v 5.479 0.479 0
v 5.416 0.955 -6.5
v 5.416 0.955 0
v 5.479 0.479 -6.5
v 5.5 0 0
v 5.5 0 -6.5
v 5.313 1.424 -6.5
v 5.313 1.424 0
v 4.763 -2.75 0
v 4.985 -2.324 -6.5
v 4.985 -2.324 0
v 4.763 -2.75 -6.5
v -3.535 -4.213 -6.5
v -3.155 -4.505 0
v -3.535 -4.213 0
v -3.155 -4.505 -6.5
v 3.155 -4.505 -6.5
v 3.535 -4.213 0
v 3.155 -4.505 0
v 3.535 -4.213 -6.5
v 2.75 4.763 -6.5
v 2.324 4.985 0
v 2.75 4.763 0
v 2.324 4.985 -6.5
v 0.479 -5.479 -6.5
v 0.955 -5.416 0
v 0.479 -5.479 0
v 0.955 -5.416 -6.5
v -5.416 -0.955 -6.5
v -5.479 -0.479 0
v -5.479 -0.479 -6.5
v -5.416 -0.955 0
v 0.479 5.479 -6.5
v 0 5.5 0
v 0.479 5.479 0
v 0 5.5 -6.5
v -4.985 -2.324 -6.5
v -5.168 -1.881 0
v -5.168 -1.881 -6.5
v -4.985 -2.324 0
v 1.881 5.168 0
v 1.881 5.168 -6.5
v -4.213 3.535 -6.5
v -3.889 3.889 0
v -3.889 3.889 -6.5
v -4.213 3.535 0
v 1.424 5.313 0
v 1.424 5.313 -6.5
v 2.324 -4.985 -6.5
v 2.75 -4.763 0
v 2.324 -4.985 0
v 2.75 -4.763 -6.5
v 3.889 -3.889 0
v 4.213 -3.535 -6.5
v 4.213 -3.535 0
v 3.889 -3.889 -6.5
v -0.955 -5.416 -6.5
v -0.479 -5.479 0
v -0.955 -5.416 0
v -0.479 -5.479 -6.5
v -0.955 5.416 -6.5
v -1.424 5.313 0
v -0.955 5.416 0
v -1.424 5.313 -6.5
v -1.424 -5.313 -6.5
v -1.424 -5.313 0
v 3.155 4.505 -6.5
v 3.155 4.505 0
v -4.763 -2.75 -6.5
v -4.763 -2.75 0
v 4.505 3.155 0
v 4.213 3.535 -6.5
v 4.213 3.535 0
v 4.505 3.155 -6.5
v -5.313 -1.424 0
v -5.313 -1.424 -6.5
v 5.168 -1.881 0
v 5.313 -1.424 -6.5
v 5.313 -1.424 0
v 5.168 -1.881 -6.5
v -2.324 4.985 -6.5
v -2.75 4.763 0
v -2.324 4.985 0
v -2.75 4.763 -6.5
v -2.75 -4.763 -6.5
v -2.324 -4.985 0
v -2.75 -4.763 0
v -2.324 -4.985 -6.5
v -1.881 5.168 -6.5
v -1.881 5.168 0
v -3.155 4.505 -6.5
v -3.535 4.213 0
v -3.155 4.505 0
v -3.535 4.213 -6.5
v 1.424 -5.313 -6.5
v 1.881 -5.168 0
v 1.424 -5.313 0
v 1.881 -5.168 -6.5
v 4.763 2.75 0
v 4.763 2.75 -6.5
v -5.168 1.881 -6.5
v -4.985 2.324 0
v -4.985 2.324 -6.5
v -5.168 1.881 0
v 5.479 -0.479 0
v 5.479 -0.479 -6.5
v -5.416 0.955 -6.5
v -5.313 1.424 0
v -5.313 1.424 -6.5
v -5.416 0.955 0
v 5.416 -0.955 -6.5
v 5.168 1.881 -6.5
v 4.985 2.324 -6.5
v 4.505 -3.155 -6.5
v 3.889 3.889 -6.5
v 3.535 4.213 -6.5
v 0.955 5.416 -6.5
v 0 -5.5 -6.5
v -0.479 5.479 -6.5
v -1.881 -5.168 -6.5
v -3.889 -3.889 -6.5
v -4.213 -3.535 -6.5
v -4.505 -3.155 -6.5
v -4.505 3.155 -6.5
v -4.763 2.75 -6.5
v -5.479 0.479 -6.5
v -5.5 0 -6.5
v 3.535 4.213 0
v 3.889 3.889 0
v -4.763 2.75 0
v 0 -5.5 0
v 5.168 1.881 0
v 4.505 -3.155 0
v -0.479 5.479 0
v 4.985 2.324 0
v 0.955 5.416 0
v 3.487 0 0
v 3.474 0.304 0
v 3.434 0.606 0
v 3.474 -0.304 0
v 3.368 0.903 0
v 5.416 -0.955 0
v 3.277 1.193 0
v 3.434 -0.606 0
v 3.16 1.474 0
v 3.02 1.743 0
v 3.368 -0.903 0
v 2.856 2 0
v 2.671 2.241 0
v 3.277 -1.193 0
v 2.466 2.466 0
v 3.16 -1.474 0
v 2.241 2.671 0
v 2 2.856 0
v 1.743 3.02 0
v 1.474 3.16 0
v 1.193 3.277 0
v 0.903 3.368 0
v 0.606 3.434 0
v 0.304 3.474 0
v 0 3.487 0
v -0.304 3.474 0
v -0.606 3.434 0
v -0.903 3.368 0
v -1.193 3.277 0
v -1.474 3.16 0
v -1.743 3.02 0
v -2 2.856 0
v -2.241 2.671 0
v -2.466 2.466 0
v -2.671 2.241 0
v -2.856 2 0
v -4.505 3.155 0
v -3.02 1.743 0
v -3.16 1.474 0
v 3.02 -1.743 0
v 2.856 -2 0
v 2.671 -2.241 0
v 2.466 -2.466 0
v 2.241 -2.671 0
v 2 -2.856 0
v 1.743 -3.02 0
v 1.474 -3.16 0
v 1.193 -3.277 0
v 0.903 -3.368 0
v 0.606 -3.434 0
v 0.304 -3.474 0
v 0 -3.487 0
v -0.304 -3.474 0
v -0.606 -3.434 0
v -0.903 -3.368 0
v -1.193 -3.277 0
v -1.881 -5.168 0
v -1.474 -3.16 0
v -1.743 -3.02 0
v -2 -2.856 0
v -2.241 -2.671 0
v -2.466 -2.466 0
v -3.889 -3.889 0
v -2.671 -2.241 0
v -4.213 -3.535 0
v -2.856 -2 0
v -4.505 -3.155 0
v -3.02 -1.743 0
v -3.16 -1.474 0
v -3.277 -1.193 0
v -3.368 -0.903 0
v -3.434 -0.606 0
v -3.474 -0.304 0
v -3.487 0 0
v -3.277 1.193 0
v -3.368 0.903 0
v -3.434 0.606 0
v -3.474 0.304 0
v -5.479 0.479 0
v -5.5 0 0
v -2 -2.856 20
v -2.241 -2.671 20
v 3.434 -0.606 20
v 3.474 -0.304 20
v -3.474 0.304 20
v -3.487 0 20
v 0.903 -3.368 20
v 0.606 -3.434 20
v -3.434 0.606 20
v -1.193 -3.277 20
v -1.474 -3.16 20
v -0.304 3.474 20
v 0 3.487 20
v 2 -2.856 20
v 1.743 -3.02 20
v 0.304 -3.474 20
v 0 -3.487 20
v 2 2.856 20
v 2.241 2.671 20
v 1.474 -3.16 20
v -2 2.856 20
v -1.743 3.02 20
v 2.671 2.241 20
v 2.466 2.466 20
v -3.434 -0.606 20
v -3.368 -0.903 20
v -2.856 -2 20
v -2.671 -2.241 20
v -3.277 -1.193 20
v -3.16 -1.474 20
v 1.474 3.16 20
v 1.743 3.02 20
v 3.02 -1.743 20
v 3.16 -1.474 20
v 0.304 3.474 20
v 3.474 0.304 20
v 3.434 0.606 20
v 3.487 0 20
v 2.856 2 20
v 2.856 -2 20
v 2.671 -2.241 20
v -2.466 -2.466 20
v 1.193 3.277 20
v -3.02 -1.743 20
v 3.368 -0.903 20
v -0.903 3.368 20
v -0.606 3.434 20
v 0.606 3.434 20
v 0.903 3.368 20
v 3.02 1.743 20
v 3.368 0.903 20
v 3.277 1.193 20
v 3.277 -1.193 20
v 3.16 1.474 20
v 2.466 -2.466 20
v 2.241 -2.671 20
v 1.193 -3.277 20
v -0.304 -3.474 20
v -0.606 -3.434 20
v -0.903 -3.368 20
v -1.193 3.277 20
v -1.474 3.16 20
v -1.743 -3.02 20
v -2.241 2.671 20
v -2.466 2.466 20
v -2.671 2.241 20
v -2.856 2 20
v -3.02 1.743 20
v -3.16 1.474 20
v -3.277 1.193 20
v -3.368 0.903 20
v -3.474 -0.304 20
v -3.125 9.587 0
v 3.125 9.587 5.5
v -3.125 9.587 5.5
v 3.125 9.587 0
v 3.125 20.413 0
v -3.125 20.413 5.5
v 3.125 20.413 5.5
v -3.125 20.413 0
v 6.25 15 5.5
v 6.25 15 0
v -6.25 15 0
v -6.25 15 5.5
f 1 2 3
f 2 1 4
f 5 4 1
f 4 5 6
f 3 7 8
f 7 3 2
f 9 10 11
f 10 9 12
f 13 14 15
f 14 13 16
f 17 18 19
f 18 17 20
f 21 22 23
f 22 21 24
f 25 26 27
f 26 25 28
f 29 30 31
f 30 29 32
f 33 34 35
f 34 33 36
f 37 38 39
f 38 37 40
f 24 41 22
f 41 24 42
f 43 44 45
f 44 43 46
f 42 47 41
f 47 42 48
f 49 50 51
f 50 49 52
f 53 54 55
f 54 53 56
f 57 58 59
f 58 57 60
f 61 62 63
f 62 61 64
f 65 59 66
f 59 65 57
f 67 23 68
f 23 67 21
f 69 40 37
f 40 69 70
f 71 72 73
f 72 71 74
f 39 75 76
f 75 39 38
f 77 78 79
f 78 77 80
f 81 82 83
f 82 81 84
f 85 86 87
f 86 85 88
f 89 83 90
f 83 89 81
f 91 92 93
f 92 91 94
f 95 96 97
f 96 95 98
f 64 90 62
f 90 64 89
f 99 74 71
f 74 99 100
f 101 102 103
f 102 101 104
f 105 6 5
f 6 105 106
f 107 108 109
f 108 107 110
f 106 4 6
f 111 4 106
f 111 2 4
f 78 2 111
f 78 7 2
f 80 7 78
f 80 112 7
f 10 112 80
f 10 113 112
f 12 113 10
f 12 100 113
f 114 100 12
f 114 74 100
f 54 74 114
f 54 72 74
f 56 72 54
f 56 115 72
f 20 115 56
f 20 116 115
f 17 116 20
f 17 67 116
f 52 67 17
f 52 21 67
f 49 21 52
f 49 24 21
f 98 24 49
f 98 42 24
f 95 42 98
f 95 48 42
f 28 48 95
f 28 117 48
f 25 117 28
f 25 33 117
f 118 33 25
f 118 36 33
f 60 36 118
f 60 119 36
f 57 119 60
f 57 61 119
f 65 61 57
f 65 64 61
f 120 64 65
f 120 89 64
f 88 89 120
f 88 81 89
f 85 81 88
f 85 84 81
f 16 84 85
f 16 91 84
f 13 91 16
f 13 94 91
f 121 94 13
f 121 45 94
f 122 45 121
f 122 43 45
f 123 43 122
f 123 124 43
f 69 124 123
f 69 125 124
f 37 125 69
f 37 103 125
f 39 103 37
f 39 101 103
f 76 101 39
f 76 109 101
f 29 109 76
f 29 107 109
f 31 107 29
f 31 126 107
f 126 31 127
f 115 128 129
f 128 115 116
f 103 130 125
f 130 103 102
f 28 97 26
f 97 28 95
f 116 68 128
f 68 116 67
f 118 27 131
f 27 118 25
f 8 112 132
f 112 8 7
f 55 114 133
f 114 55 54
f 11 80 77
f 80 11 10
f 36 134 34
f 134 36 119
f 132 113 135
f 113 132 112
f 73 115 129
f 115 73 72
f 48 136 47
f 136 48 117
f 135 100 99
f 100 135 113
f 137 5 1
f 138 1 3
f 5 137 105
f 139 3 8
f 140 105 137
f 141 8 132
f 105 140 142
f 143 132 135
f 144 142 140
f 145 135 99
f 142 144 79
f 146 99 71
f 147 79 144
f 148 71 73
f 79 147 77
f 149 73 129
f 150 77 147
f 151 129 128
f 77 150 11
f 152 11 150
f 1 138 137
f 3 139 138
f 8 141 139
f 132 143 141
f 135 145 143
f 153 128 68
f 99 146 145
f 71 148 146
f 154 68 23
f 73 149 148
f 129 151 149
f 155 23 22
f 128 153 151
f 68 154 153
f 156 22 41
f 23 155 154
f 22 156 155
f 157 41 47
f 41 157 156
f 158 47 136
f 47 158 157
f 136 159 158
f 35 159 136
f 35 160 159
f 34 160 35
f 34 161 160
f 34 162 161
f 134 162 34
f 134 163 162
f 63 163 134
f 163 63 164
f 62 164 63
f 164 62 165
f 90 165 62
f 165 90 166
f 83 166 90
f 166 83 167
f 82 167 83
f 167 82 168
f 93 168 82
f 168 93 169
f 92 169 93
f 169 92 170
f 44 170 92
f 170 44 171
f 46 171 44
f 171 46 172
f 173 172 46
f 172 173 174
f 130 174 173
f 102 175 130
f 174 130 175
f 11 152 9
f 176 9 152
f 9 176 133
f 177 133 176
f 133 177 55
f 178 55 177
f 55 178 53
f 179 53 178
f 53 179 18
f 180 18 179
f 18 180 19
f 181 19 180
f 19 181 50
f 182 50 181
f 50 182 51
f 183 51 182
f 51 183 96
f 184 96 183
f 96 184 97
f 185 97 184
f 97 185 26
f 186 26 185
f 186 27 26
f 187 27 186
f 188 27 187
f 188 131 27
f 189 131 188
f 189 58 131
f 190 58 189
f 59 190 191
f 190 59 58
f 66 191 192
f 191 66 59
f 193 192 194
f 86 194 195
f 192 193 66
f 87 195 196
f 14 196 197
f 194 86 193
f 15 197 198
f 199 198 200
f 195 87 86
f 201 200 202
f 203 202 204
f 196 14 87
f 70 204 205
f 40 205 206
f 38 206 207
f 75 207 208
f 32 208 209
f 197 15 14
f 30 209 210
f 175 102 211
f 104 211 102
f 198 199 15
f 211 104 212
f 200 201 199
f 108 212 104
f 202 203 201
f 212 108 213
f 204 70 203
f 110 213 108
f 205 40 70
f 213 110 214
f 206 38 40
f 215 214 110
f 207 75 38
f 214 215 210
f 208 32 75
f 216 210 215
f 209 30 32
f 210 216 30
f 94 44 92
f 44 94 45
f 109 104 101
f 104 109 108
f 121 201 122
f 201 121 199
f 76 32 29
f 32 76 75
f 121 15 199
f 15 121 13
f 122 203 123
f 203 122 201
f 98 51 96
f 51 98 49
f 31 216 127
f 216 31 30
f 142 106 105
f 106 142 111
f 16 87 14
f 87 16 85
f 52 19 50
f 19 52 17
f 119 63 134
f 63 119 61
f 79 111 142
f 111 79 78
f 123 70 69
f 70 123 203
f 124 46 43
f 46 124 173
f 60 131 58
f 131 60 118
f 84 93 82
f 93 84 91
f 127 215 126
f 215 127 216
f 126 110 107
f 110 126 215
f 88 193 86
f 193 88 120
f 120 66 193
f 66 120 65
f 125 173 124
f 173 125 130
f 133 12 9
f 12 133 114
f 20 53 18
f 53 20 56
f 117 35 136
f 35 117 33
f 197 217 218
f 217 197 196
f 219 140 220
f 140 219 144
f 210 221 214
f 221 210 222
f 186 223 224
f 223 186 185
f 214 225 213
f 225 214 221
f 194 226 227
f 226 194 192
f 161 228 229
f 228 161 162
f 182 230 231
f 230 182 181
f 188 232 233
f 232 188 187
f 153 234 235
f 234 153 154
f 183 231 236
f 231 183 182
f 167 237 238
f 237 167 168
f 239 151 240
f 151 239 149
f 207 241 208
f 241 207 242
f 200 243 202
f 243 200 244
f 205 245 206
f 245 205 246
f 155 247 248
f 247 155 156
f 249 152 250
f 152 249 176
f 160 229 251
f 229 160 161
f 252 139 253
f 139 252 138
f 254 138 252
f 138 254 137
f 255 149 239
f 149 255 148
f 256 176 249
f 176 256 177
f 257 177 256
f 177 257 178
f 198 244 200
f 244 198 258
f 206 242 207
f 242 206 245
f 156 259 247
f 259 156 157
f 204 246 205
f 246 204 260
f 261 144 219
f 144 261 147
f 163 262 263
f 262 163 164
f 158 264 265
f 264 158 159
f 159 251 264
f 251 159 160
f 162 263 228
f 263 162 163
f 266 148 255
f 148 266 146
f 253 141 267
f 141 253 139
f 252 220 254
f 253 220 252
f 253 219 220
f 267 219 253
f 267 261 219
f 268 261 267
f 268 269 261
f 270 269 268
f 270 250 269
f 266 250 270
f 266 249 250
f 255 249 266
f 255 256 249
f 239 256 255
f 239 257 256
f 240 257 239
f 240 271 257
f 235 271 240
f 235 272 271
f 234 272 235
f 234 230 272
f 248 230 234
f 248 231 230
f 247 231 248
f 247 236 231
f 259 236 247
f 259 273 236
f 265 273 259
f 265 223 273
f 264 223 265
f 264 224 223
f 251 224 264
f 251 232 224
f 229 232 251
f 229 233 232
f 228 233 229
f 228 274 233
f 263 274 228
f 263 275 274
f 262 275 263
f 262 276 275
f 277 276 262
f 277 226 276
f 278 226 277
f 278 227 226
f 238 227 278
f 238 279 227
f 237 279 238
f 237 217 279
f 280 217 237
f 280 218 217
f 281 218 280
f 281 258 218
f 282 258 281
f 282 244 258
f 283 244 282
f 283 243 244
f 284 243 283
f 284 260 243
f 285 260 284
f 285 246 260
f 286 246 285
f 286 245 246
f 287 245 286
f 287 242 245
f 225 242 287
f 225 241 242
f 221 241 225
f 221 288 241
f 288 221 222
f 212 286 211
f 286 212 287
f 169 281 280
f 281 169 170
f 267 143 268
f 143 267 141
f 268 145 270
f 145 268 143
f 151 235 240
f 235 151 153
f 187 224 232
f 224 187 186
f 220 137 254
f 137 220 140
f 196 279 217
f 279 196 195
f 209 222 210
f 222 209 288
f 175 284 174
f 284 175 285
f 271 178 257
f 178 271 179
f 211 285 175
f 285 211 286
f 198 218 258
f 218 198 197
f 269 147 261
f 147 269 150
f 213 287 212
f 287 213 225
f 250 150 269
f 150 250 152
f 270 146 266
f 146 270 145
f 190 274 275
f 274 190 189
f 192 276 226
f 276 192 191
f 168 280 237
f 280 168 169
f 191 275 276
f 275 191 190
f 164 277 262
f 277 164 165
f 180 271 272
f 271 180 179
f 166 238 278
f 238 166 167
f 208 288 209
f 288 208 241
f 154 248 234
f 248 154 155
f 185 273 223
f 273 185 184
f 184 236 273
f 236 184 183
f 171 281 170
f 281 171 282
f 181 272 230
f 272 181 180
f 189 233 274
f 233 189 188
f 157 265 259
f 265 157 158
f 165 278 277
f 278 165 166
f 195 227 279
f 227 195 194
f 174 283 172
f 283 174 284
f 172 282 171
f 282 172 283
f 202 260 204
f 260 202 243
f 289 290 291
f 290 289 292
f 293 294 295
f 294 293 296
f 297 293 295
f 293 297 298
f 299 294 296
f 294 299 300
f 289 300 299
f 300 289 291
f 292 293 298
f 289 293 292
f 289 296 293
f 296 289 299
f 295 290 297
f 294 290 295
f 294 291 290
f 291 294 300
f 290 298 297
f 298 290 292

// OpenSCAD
use <MCAD/nuts_and_bolts.scad>

translate([0,15]) # nutHole(size = 6, units="MM", tolerance = 0.5);
	
boltHole(size = 6, length=20,units="MM", tolerance = 0.5, $fn=72);
